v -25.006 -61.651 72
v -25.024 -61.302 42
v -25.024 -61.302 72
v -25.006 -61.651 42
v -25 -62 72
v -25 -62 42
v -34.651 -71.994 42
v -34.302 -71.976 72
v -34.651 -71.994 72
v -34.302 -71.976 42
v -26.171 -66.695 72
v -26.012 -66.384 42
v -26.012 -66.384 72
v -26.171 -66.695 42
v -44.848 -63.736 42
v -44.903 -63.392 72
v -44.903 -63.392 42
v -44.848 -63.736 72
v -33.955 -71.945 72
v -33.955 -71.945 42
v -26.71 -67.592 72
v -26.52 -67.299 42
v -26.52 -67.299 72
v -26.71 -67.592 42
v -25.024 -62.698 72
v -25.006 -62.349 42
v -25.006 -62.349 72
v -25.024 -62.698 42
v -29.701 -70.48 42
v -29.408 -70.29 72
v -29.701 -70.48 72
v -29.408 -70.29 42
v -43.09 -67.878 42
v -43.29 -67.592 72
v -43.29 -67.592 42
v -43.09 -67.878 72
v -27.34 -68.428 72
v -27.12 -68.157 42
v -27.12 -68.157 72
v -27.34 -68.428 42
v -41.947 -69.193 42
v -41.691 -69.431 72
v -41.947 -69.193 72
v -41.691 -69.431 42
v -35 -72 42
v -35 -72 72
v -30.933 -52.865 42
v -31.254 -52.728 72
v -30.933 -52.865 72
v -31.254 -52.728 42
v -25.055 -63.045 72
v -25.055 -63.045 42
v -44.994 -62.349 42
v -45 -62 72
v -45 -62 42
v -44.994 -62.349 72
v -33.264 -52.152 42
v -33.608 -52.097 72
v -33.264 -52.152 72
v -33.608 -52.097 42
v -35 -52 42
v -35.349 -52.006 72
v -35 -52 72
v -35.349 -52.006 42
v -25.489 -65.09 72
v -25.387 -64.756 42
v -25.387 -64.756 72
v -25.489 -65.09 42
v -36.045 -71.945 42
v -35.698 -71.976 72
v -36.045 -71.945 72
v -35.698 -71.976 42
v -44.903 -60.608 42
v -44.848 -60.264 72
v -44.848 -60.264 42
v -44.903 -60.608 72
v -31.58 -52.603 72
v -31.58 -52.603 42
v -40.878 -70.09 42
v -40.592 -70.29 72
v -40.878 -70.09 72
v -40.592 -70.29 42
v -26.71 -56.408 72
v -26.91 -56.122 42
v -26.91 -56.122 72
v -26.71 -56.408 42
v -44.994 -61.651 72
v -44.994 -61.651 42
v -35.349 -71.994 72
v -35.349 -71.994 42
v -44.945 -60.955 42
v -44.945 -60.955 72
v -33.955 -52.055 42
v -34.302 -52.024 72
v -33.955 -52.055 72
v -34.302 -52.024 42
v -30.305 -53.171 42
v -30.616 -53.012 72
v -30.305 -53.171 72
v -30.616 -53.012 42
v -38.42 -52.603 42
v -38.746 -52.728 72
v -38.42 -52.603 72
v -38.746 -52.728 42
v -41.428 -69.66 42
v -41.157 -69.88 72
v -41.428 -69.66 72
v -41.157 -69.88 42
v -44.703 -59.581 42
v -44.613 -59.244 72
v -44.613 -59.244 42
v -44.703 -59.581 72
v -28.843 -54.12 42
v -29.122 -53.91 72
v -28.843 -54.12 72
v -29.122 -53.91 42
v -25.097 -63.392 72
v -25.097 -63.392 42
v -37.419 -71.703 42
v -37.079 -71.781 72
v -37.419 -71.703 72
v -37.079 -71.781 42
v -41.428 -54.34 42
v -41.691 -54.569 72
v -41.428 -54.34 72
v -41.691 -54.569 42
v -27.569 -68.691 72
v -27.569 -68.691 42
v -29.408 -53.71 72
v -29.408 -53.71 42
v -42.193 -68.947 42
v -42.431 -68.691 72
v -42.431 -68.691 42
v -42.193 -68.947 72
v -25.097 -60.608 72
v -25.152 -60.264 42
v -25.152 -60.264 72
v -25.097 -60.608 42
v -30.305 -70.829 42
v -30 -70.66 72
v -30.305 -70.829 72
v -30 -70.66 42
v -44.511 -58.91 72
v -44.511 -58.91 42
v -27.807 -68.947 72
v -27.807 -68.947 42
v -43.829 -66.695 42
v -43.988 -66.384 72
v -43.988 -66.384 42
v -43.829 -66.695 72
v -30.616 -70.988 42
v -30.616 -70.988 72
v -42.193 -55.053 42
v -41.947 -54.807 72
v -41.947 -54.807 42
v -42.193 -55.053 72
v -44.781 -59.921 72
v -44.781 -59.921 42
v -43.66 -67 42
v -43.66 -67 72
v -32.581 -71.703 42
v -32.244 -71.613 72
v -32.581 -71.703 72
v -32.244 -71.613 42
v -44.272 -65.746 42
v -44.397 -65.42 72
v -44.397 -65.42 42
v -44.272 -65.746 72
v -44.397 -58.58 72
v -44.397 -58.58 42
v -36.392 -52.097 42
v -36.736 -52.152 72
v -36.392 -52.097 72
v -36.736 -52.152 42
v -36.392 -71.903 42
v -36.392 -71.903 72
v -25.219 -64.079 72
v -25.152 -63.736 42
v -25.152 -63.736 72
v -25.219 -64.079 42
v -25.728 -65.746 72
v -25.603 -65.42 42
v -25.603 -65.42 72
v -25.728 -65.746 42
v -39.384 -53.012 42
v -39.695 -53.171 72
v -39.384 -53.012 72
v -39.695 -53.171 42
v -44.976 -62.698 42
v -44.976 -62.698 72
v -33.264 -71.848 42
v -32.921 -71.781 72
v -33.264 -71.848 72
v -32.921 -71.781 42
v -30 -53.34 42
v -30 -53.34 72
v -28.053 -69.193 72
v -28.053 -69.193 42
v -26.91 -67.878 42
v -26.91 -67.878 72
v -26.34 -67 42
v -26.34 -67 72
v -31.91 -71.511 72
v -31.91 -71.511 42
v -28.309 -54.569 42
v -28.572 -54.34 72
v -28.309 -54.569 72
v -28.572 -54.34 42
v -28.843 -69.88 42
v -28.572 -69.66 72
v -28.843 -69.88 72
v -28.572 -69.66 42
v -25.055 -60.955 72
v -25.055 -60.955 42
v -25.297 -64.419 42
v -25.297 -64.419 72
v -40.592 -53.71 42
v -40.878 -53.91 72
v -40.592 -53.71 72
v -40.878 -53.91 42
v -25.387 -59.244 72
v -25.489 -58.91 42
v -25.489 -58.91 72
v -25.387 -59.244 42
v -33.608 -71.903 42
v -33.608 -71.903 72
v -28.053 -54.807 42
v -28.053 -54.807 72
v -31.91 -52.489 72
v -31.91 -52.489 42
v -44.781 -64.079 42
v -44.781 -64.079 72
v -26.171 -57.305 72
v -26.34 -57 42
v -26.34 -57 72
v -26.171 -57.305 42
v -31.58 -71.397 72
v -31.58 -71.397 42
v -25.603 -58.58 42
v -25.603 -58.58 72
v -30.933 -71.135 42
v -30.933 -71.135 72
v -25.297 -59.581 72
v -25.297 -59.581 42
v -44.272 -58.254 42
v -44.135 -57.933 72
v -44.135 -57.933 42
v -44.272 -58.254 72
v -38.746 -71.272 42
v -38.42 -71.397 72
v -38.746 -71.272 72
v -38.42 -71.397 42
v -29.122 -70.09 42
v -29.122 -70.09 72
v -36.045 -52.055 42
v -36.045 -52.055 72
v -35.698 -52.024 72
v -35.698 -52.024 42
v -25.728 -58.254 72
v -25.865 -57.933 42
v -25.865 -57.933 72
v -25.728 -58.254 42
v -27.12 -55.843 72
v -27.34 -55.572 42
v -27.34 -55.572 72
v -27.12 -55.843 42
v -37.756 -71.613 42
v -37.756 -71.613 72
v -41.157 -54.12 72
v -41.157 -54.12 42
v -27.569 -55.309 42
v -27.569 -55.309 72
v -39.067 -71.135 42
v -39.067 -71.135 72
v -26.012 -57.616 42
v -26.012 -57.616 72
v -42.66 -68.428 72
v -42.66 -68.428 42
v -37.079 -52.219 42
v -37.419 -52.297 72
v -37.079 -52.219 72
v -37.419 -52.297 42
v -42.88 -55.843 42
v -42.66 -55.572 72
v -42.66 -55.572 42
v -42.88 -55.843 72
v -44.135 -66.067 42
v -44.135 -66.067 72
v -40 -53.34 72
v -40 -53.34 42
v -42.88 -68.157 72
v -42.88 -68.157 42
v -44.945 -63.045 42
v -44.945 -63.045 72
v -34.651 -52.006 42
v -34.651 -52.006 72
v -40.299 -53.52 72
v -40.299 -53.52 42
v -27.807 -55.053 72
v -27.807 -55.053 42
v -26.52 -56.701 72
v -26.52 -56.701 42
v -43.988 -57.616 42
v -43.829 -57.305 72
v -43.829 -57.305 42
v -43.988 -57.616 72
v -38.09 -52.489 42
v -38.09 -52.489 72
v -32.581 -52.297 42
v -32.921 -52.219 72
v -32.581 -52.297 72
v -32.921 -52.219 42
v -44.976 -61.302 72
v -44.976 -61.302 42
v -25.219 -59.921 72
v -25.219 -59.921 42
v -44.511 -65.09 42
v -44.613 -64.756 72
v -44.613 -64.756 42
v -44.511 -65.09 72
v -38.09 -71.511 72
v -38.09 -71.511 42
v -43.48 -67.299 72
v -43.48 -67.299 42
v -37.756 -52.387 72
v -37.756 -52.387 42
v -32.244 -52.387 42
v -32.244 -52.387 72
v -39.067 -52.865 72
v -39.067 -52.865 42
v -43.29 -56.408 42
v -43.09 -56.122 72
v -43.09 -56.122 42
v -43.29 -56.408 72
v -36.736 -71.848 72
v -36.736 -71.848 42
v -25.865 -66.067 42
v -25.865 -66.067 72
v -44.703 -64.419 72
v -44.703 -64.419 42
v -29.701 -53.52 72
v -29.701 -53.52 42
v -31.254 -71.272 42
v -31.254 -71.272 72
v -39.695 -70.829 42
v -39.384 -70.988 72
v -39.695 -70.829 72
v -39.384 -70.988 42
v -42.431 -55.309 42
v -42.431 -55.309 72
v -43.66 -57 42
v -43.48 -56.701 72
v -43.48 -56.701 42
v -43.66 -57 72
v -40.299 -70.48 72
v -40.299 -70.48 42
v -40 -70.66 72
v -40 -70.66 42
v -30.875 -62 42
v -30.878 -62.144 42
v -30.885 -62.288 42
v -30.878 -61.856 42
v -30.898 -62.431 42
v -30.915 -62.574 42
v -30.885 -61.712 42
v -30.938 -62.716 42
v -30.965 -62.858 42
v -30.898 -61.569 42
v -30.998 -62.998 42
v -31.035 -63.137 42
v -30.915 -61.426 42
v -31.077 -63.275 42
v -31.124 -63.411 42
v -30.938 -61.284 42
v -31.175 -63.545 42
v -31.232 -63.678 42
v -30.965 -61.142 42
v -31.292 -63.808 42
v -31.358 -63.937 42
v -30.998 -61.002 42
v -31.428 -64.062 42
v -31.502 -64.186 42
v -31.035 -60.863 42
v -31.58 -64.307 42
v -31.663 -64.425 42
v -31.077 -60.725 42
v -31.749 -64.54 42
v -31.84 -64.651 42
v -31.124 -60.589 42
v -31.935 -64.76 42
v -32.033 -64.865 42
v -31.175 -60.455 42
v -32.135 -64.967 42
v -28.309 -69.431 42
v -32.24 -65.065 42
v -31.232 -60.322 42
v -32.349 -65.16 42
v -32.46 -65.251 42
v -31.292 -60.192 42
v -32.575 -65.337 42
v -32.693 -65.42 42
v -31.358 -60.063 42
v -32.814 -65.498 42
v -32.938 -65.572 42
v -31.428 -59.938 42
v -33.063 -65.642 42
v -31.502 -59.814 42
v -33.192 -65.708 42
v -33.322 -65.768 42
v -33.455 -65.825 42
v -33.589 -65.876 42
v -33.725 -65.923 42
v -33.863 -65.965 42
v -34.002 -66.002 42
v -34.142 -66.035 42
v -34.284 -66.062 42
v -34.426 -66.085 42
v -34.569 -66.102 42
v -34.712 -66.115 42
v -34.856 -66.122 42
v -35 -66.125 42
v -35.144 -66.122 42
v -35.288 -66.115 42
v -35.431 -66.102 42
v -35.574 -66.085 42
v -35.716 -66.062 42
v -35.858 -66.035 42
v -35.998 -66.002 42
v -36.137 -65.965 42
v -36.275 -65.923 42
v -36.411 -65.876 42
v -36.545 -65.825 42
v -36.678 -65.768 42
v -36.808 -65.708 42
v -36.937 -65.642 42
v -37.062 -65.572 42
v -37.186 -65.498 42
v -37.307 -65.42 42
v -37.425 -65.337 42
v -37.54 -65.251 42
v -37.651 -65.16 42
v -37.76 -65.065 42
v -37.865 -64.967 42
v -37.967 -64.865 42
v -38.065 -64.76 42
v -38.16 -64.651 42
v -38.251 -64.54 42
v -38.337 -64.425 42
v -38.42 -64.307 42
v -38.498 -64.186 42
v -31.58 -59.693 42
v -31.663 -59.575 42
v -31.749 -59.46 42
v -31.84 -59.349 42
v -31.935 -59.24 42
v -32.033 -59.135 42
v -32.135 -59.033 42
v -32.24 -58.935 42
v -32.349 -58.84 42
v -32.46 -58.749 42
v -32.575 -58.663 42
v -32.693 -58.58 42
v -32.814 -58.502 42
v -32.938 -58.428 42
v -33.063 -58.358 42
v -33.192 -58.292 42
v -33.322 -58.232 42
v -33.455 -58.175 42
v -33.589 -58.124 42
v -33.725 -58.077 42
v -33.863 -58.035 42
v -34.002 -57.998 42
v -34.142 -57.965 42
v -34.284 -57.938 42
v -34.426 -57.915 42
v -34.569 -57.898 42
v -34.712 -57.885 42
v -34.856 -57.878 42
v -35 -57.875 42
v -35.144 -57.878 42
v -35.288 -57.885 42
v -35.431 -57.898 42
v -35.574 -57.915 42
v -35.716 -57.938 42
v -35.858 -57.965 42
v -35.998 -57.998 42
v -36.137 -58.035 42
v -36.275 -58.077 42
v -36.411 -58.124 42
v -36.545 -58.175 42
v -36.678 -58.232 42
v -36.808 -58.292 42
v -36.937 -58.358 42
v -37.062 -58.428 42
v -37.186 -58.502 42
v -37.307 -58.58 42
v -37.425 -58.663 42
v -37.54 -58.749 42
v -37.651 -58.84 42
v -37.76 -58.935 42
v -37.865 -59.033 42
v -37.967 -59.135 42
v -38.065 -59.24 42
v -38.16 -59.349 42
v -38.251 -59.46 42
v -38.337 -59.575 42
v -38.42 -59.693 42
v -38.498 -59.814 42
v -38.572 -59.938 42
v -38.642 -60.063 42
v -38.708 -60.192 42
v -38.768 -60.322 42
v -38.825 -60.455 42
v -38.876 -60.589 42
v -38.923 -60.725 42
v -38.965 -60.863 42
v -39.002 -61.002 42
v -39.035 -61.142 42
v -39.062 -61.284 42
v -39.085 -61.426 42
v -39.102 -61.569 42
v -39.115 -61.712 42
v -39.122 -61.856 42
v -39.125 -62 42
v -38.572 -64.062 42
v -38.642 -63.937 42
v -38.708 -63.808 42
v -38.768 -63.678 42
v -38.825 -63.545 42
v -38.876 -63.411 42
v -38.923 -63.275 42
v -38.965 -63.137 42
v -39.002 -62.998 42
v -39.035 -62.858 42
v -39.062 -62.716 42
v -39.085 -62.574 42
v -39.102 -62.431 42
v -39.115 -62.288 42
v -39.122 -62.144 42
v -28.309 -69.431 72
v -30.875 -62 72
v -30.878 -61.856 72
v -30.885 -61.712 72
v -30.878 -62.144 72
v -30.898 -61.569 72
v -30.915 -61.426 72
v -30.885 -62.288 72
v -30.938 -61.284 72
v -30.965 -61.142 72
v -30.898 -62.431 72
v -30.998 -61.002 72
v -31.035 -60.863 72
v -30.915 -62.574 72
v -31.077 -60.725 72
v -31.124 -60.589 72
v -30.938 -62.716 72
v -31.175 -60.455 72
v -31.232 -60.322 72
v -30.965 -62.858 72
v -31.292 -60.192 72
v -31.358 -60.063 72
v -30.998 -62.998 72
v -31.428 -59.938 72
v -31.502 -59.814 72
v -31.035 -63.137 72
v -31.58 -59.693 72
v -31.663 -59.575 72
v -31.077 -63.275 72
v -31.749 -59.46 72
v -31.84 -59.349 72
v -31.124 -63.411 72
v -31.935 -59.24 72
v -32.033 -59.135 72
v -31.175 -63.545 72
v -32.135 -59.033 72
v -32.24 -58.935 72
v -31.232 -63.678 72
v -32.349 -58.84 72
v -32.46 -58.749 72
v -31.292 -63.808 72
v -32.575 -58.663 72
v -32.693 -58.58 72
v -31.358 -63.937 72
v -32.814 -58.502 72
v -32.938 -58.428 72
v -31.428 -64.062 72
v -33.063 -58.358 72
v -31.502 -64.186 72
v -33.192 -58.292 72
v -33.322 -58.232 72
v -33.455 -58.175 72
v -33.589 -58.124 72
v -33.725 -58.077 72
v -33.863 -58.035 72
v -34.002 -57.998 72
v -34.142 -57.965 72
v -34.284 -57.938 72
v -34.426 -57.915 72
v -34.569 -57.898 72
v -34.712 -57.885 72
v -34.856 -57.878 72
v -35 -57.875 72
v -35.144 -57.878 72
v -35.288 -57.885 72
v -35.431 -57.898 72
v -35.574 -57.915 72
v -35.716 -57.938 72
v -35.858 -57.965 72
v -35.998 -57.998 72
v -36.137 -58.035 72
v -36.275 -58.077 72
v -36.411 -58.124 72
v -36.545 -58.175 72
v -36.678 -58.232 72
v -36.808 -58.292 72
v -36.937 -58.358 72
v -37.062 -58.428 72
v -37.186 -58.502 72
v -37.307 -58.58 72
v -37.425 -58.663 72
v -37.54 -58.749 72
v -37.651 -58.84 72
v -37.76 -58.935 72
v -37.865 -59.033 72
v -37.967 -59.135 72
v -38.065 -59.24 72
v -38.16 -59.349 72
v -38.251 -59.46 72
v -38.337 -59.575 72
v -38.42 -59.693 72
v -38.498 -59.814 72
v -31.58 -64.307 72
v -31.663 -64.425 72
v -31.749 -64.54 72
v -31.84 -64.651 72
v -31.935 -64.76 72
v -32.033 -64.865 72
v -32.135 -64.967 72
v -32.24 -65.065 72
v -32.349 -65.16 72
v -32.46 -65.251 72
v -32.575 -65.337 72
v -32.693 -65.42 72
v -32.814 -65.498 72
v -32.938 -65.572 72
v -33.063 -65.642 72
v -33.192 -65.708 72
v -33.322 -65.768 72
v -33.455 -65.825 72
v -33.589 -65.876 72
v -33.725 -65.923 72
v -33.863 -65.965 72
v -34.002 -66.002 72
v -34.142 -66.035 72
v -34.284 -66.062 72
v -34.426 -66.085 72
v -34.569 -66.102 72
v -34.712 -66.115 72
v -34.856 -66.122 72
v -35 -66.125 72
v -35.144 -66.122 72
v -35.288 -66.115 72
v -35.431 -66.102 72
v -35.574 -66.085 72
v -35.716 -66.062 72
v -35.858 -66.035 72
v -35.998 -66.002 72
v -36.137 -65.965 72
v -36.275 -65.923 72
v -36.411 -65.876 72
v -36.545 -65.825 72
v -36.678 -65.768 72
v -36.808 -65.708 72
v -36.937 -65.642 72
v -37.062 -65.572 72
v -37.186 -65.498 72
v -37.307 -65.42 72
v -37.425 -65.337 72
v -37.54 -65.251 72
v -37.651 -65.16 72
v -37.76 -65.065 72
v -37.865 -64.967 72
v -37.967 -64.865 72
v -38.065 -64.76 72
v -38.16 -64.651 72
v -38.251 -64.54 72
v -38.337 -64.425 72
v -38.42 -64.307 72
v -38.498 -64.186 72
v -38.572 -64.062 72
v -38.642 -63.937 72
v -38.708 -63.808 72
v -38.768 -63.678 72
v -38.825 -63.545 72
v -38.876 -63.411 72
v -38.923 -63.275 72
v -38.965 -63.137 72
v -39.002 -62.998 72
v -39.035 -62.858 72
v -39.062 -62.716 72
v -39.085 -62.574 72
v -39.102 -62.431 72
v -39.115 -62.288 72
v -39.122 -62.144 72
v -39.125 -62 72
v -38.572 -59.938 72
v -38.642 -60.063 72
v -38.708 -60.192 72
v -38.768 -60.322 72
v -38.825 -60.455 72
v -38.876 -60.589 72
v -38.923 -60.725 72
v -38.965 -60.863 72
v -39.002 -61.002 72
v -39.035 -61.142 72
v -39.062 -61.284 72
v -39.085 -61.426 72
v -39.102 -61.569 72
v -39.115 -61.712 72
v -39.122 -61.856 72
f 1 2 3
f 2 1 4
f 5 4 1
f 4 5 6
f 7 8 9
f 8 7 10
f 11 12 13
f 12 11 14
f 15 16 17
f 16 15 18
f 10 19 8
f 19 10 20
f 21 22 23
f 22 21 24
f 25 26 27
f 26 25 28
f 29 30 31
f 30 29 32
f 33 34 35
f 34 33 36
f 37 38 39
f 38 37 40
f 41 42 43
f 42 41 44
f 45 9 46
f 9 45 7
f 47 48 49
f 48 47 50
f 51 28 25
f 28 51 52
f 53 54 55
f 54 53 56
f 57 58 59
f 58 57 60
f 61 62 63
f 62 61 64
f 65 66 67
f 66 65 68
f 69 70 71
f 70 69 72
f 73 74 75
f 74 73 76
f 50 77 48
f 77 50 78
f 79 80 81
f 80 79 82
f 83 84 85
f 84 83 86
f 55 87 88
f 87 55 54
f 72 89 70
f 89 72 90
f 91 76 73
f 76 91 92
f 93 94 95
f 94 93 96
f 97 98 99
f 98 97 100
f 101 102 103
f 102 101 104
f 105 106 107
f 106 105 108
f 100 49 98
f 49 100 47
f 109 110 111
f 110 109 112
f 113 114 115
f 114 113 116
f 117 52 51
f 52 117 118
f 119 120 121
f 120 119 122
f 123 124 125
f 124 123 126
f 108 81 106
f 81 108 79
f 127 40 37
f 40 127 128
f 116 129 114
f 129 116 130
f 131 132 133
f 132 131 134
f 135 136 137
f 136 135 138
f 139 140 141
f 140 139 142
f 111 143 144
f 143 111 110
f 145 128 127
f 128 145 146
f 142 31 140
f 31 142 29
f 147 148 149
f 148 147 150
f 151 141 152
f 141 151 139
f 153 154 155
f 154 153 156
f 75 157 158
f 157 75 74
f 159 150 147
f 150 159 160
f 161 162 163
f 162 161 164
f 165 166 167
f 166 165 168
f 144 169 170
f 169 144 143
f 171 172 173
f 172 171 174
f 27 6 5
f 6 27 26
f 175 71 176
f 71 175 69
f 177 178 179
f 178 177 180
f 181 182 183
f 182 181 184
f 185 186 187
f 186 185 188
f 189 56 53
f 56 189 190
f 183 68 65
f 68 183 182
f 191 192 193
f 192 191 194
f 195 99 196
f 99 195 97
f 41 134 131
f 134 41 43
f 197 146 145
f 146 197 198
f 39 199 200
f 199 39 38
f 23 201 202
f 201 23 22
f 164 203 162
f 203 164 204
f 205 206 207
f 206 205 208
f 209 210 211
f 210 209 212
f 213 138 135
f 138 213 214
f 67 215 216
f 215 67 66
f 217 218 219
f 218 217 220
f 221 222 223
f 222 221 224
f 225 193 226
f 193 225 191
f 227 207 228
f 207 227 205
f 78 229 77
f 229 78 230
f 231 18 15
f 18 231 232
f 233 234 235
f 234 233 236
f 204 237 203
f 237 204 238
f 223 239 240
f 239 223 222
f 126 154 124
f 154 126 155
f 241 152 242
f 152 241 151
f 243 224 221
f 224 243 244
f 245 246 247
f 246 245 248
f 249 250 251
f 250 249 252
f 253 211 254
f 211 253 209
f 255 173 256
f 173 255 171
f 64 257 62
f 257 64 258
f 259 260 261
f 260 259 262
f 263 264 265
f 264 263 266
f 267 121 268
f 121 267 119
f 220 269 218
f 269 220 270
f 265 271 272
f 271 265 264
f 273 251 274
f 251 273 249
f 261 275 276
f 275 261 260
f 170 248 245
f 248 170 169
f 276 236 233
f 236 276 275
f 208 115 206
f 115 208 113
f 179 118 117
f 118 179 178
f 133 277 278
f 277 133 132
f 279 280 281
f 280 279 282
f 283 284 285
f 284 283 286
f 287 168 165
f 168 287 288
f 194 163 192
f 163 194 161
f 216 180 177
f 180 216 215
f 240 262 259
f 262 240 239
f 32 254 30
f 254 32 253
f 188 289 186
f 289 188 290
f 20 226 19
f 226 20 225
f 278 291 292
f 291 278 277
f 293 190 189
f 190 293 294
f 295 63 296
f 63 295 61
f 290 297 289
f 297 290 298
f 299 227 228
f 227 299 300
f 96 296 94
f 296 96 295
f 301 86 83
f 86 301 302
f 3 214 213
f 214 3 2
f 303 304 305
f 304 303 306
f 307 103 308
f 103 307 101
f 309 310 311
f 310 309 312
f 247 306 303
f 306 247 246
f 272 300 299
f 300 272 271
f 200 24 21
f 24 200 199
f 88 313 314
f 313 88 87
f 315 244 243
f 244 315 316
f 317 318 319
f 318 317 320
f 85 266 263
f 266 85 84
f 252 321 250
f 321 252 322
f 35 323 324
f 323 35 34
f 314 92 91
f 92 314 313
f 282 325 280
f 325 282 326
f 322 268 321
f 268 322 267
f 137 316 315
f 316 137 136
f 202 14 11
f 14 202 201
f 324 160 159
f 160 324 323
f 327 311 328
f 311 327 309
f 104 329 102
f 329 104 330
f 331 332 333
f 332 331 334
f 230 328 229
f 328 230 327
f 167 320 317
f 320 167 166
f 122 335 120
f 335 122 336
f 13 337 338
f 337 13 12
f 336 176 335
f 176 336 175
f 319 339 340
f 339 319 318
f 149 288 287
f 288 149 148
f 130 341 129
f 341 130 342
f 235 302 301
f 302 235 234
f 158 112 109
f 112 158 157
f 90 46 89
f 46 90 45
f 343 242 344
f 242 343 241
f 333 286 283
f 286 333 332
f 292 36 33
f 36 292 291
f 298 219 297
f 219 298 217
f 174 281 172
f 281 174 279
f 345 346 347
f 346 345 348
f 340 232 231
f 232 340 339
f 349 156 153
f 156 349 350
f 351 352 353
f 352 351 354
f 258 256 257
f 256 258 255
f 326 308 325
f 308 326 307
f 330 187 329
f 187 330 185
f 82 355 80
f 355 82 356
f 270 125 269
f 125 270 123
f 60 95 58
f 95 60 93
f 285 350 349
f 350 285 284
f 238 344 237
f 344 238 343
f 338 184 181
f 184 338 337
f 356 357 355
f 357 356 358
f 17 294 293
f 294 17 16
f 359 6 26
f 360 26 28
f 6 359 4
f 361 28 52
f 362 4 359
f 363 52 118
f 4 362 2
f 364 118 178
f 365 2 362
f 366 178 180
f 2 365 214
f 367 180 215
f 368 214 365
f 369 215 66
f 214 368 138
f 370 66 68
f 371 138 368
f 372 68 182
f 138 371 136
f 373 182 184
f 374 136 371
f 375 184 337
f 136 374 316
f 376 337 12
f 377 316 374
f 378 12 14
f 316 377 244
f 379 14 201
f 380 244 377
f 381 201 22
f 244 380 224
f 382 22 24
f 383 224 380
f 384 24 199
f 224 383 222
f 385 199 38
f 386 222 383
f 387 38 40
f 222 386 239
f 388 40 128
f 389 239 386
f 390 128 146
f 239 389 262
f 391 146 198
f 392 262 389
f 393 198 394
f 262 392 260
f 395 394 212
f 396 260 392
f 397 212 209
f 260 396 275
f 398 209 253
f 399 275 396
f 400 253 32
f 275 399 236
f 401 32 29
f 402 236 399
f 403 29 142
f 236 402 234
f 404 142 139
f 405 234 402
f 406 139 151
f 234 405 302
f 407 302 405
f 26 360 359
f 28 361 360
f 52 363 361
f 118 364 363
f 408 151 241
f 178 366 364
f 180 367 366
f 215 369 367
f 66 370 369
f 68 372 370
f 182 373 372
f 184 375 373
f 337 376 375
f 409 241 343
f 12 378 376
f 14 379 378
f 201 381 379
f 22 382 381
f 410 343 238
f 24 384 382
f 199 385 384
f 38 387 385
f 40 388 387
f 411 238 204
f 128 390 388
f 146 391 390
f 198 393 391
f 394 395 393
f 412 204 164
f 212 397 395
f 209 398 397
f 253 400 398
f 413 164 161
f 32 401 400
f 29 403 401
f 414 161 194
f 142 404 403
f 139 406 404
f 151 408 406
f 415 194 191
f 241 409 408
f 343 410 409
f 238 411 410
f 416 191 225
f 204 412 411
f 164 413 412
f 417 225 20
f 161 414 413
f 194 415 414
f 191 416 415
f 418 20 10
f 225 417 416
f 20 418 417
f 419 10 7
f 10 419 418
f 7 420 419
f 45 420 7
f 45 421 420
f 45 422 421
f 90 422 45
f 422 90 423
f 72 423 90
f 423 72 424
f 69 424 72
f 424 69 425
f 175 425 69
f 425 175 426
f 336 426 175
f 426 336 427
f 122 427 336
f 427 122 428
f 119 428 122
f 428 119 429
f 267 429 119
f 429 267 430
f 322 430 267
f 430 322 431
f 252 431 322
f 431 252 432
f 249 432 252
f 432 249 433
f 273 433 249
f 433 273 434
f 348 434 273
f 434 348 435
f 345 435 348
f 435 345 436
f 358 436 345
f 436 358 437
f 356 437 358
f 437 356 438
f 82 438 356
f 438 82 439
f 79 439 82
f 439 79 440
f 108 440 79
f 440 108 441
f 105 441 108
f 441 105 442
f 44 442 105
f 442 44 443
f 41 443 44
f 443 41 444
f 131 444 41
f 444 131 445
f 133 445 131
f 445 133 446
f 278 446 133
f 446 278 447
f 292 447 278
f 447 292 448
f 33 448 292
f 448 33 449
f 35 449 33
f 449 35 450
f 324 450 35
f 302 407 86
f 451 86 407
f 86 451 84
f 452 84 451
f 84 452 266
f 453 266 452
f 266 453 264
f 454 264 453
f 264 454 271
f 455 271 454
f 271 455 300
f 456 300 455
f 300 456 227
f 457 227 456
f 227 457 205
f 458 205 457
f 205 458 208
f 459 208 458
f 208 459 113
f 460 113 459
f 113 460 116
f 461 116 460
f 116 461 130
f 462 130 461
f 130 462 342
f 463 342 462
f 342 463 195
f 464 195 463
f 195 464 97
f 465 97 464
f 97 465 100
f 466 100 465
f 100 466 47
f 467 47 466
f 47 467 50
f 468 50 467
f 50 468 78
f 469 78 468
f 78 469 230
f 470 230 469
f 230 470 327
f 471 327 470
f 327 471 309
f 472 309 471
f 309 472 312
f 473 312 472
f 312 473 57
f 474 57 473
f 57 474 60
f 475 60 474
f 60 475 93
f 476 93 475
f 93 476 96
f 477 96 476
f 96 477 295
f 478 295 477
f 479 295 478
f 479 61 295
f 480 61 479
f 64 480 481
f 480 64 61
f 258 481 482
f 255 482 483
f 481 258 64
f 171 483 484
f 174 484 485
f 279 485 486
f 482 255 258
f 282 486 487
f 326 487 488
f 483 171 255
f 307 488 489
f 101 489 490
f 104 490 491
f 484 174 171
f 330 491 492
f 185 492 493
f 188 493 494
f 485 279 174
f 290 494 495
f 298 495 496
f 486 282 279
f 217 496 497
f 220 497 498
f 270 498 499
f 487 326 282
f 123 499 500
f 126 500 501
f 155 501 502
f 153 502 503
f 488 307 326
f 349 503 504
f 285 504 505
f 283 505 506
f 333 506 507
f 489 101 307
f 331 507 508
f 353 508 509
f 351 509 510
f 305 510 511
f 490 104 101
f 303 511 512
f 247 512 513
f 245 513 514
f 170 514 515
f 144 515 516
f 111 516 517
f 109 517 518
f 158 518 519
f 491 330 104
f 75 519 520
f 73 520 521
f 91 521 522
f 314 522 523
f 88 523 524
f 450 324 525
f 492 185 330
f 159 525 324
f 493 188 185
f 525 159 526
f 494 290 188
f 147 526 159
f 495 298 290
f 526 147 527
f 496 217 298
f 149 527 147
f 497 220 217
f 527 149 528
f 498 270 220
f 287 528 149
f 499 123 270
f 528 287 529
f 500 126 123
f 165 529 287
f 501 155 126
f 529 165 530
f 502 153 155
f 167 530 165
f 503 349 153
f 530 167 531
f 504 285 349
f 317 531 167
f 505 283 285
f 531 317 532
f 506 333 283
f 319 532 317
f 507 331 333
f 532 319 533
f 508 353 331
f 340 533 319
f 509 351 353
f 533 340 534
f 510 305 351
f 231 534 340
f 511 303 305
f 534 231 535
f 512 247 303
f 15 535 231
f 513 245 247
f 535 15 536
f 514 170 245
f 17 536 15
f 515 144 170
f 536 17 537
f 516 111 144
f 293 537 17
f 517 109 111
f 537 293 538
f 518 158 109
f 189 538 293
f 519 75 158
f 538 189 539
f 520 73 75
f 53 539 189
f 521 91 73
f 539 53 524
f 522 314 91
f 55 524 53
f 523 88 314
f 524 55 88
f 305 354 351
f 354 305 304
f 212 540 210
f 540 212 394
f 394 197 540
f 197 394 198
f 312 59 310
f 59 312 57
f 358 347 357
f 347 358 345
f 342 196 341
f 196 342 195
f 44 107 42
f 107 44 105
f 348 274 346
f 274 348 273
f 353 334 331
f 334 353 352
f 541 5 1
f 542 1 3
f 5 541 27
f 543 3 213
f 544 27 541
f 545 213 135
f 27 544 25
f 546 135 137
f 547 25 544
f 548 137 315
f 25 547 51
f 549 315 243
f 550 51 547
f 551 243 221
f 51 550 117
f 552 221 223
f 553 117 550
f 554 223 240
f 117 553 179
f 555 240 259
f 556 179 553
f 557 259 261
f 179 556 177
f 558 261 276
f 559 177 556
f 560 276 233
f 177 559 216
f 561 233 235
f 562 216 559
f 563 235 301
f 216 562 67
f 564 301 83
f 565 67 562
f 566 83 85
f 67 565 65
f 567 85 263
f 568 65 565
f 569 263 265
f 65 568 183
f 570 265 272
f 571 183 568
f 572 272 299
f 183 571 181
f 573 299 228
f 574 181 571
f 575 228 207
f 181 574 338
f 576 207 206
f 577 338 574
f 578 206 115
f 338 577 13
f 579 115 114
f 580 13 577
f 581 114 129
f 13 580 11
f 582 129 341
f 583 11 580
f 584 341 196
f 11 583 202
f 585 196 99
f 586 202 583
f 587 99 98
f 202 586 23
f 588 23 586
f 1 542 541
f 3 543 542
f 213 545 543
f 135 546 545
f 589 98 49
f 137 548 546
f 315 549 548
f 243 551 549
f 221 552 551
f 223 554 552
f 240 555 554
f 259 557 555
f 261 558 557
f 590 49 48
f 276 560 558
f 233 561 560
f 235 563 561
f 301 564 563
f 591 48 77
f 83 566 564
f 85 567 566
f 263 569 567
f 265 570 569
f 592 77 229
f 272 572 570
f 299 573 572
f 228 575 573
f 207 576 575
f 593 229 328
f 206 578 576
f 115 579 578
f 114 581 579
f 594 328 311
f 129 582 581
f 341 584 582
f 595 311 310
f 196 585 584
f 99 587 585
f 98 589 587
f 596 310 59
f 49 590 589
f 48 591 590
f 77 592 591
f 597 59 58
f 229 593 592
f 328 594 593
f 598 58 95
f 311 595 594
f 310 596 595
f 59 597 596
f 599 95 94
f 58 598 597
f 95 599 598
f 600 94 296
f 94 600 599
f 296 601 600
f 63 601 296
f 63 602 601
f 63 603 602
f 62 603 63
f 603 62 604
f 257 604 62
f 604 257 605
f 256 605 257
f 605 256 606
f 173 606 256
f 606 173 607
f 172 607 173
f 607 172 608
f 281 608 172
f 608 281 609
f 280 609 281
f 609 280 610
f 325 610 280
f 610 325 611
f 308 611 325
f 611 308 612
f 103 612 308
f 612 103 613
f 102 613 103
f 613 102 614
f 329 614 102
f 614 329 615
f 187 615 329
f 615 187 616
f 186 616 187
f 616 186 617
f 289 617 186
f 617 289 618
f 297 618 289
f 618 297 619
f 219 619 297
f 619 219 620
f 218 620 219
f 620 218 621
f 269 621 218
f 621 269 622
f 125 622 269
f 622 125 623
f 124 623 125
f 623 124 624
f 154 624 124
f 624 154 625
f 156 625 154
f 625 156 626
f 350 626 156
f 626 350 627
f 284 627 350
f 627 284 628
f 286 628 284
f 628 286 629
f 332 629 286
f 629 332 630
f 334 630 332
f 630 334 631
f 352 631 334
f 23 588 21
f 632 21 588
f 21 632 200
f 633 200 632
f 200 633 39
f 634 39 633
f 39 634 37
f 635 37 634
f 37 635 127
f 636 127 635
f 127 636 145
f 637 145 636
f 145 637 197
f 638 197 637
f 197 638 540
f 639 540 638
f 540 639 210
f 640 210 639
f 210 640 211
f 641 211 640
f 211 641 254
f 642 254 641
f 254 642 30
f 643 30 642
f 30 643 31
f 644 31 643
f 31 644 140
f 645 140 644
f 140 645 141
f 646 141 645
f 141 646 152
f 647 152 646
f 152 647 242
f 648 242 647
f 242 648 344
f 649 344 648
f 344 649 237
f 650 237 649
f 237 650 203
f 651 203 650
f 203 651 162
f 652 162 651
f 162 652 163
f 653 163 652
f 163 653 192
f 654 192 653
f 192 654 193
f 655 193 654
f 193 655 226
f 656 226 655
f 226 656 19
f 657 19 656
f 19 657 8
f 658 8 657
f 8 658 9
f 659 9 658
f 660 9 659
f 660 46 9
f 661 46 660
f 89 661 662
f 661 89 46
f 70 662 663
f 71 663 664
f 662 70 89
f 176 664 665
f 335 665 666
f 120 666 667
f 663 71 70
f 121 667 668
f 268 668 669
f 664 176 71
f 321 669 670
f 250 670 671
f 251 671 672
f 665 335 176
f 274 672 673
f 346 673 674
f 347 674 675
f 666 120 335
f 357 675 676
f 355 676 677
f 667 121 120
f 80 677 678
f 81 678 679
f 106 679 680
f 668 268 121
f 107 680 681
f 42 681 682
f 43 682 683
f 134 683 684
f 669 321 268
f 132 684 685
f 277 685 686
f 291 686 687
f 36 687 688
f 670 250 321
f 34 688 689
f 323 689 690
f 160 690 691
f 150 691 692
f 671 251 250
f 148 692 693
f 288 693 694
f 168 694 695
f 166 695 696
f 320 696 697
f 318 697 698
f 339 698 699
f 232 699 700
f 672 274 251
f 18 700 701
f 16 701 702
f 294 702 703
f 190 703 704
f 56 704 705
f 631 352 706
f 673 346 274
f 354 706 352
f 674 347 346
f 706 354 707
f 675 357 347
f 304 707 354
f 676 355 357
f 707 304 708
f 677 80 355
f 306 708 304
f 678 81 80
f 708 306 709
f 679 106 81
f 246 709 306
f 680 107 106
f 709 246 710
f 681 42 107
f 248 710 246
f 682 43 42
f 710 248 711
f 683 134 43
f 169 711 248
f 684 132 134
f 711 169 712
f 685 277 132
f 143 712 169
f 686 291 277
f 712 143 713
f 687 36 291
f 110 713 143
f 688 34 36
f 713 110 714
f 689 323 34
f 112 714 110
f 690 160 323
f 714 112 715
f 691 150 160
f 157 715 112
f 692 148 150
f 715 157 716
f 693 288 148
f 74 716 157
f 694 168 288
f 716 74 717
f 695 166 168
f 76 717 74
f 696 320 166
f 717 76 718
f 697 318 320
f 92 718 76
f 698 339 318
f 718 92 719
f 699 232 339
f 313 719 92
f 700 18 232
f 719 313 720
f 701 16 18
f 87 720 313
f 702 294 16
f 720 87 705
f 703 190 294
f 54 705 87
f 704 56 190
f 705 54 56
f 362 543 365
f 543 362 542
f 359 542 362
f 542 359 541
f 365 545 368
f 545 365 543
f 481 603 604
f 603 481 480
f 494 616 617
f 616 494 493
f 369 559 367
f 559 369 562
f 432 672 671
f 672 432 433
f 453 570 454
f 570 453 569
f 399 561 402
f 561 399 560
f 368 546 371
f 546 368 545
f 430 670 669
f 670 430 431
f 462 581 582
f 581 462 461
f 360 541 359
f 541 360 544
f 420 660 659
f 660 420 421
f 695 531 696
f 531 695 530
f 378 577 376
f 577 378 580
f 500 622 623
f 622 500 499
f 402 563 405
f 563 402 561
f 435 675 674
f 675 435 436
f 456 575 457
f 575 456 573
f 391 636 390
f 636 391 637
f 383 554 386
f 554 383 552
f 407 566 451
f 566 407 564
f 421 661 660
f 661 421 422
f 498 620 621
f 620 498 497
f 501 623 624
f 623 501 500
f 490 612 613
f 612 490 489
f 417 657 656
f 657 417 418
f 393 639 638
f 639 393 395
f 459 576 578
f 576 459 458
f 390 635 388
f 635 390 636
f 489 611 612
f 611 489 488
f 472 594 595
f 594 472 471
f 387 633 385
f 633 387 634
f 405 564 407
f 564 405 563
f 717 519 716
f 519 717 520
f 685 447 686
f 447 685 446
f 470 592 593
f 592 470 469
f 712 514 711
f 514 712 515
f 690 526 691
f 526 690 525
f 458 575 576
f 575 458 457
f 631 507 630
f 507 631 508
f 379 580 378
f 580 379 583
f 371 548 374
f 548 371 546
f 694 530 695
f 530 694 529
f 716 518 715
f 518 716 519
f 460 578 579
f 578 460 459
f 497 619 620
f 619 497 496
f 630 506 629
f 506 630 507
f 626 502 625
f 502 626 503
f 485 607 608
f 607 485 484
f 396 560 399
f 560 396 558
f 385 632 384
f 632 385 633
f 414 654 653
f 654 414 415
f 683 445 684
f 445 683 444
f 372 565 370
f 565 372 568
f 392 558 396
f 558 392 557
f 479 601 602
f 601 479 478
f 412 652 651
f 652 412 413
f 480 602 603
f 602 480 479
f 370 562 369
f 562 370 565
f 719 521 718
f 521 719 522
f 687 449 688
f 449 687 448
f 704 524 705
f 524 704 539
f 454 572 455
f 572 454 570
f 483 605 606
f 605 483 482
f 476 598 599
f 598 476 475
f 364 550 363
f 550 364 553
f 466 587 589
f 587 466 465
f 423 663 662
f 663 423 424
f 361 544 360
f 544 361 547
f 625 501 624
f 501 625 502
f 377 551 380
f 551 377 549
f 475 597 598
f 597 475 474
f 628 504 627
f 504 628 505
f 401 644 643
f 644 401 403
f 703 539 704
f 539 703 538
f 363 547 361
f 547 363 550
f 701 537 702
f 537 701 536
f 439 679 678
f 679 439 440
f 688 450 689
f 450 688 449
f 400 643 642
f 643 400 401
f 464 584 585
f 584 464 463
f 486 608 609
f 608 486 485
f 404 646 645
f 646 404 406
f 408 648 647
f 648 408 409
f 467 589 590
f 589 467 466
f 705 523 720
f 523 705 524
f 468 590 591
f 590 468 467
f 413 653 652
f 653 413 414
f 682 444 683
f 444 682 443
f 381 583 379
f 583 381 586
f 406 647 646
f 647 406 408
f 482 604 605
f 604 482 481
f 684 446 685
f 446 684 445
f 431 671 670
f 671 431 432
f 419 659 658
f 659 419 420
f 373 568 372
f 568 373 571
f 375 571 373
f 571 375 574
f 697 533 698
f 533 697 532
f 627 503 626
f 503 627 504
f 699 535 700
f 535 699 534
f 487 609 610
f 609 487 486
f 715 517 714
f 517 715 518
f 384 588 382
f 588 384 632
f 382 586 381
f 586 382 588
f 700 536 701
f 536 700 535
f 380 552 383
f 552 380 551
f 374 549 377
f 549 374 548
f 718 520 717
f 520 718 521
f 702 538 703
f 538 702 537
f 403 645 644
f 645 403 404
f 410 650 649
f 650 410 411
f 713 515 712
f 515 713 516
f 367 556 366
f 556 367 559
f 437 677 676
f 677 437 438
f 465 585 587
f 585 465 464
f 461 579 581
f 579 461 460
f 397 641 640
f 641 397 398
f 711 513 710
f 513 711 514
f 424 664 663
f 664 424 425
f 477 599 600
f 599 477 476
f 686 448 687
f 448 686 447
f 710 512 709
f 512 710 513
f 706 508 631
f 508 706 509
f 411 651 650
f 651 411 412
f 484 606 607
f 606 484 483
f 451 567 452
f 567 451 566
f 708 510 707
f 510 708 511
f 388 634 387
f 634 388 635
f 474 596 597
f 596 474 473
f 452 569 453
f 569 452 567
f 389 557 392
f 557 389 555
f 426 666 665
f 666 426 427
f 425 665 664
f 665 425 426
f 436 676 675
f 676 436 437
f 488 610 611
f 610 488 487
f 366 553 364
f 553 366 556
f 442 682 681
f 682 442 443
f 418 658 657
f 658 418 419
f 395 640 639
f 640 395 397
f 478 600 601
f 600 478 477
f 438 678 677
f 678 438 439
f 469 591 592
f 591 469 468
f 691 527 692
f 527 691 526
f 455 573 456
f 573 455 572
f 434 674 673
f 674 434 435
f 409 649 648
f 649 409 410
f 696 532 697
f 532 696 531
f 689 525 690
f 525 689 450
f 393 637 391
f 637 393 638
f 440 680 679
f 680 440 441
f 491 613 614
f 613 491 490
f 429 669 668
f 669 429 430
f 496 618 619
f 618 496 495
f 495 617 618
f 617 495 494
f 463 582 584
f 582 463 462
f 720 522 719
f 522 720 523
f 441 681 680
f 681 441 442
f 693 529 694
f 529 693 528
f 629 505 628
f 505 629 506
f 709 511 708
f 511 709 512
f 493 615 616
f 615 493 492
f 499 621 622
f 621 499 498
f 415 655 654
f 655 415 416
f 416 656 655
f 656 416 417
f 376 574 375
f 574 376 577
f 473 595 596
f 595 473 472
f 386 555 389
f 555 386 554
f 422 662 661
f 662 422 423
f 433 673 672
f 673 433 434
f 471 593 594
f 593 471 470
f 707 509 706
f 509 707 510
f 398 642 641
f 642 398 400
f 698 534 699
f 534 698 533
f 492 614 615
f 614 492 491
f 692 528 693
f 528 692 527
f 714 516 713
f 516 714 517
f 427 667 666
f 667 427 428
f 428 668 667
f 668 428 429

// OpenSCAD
//cube([120,120,3], center = true);
//translate([-45,-45,0])cylinder(h = 3, r=15, $fn = 180, center = true);
//rotate_extrude(convexity = 10, $fn = A) translate([20+1.5, 0, 0])circle(d = 3, $fn = B);


//translate([63.25,0,142.5])rotate([0,-90,45])import("spool_mount.stl");


//BearingBlock();
//gearboxBottom();
//gearboxTop();
//spacer();



//translate([63.25,0,2.5])smallGear();
//translate([0,0,0]) largeGear();


//translate([63.25,0,60+35]) largeGear();
//translate([0,0,62.5+35])smallGear();


//translate([0,0,-10]) gearboxBottom();

//translate([0,0,10]) gearboxTop();


//translate([0,0,45])gearboxTop2();

//translate([0,0,105])gearboxTop3();

//translate([63.25,0,47+10])BearingBlock();

//translate([0,0,142+10])BearingBlock();
    

//for(i=[-1,1])translate([-60,i*40,45])extentionblock();

//for(i=[-1])for(j=[0])translate([-35,i*(40+22),10+j*95])spacer();
    
//for(i=[-1,1])for(j=[0,1])translate([63.25+35,i*(40+22),10+j*95])spacer();


for(i=[-1])for(j=[1])translate([-35,i*(40+22),10+j*47])spacer_small();
    
//for(i=[-1,1])for(j=[1])translate([63.25+35,i*(40+22),10+j*47])spacer_small();

//translate([0,0,15]) gearboxExtention();







module BearingBlock(){
    
difference(){       
cube([30,80,10], center = true);   
  

for(i=[-1,1])translate([0,i*30,0])cylinder(h = 11, d=6.25, $fn = 180, center = true);
    
for(i=[-1,1])translate([0,i*30,2.5])cylinder(h = 5, d=11.5, $fn = 6, center = true);


translate([0,0,0])cylinder(h = 11, d=14, $fn = 180, center = true);

}

}










module gearboxExtention(){

difference(){
union(){
 
translate([15,0,30])cube([110,100,8], center = true);   
   
   
}

cylinder(h = 80, d=11, $fn = 180, center = true);

for(i=[0,1])mirror([0,i,0])translate([60,40,0]) cylinder(h = 100, d=11, $fn = 180, center = true);
    
for(i=[0,1])mirror([0,i,0])translate([-30,40,0]) cylinder(h = 100, d=11, $fn = 180, center = true);


translate([35,0,0])cylinder(h = 80, d=11, $fn = 180, center = true);


translate([0,0,0]) for(i=[0:2])rotate([0,0,90+i*90])translate([31,0,0]) cylinder(h = 80, d=6.25, $fn = 180, center = true);
    

for(i=[0:1])mirror([0,i,0])translate([15,52,30])cube([60,20,9], center = true);   
    
for(i=[0:1])mirror([0,i,0])translate([-30,35,30])cube([30,40,9], center = true); 

translate([50,0,30])cube([70,110,9], center = true); 



}

}













module extentionblock(){
 
difference(){    
//cube([20,20,8], center = true); 
    
cylinder(h = 8, d=20, $fn = 180, center = true);      
  
cylinder(h = 10, d=5.2, $fn = 180, center = true);    
}    
}    

















module spacer(){
    
    
difference(){    
cylinder(h = /*45*/ 55, d=20, $fn = 180, center = true); 
   
//cube([20,20,45], center = true);    


cylinder(h = 56, d=8.25, $fn = 180, center = true);  
    
translate([-5,4.7,27])linear_extrude(height = 1)text("PLA",4);    
}

}






module spacer_small(){
    
difference(){    
cylinder(h = /*45*/ 30, d=20, $fn = 180, center = true); 
   
//cube([20,20,45], center = true);    


cylinder(h = 56, d=8.25, $fn = 180, center = true);  
    
translate([-5,4,27])linear_extrude(height = 1)text("PLA",4);    
}
    
    
}


















module gearboxBottom(){

difference(){
union(){
    
 
    
//Plate 
translate([15-5+21.5,0,-10+0.5])cube([110+45,100+45,5], center = true);   
}

for(i=[0:1])mirror([0,i,0])translate([32,60+10,-10])cube([110,30,7], center = true);  


//extra eliminations/////   
//translate([-30-30,0,-10])cube([28,50,5], center = true); 

//translate([70.5,0,-10])cube([25,15,5], center = true); 
/////////////////////////


//connector holes/////
for(i=[-1,1])translate([63.25+35,i*(40+22),0]) cylinder(h = 100, d=8.25, $fn = 180, center = true);
    
for(i=[-1,1])translate([-35,i*(40+22),0]) cylinder(h = 100, d=8.25, $fn = 180, center = true);
/////////////////////

//mid hole large hear
cylinder(h = 50, d=11, $fn = 180, center = true);

//small gear hole
translate([35-35+63.25,0,0])cylinder(h = 50, d=11, $fn = 180, center = true);





//translate([35,0,0]) for(i=[0:3])rotate([0,0,45+i*90])translate([31,0,0]) cylinder(h = 50, d=5.25, $fn = 180, center = true);


//Flange bearing holes
for(i=[0:1])mirror([0,i,0])translate([0,36.5/2,0])cylinder(h = 80, d=5.25, $fn = 180, center = true);



translate([35-35+63.25,0,0])for(i=[0:3])rotate([0,0,i*90])translate([15.5,15.5,0])cylinder(h = 80, d=7, $fn = 180, center = true);


//holes for stepper motor screws
translate([15.5,0,15.5]) rotate([90,0,0]) cylinder(h = 80, d=3, $fn = 180, center = true);

translate([-15.5,0,15.5]) rotate([90,0,0]) cylinder(h = 20, d=3, $fn = 180, center = true);

translate([-15.5,0,-15.5]) rotate([90,0,0]) cylinder(h = 20, d=3, $fn = 180, center = true);

translate([15.5,0,-15.5]) rotate([90,0,0]) cylinder(h = 20, d=3, $fn = 180, center = true);



}



translate([35-35+63.25,0,-2]) rotate([90,0,0]){

////////////////////////////////////////////////////////
//Stepper motor mount
////////////////////////////////////////////////////////

difference(){
    
union(){    
for(i=[0:1]) rotate([0,0,0]) translate([0,-50+5+3,0]) rotate([90,i*90,0]) cube([50-8,23,10], center = true);  

rotate([0,0,0]) translate([0,-50+5+3,0]) rotate([90,0,0]) cylinder(h = 10, d=35, $fn = 180, center = true); 


translate([0,-40,0]) cube([42,6,42], center = true);


}
   
//translate([0,-50+5,0]) rotate([90,0,0]) cube([5,25,20], center = true);


//middle hole    
translate([0,-50+5,0]) rotate([90,0,0]) cylinder(h = 30, d=23, $fn = 180, center = true); 





//holes for stepper motor screws
translate([15.5,-50+5,15.5]) rotate([90,0,0]) cylinder(h = 20, d=3, $fn = 180, center = true);

translate([-15.5,-50+5,15.5]) rotate([90,0,0]) cylinder(h = 20, d=3, $fn = 180, center = true);

translate([-15.5,-50+5,-15.5]) rotate([90,0,0]) cylinder(h = 20, d=3, $fn = 180, center = true);

translate([15.5,-50+5,-15.5]) rotate([90,0,0]) cylinder(h = 20, d=3, $fn = 180, center = true);





}


translate([0,-50+5,0]) rotate([0,0,0]){
difference(){
    
    
union(){    
//stepper motor plate
translate([0,0,0]) cube([42,5,42], center = true);


      
rotate([0,0,0]) translate([0,30-5-2-2,0]) cube([42+10,55-10-15,5+2], center = true);
  
rotate([0,90,0]) translate([0,30-5-2-2,0]) cube([42+10,55-10-15,5+2], center = true); 
    
    
//baseplate
//rotate([0,0,0]) translate([0,0,0]) rotate([90,0,0]) cube([50,23,5], center = true);    

}    
  


//middle hole in frame
translate([0,22.5,0]) rotate([90,0,0]) cylinder(h = 60, d1=23, d2=23, $fn = 180, center = true); 



//hole in bearing hole
//translate([0,50,0]) rotate([90,0,0]) cylinder(h = 15, d=25, $fn = 180, center = true); 



//holes for stepper motor screws
translate([15.5,0,15.5]) rotate([90,0,0]) cylinder(h = 20, d=3, $fn = 180, center = true);

translate([-15.5,0,15.5]) rotate([90,0,0]) cylinder(h = 20, d=3, $fn = 180, center = true);

translate([-15.5,0,-15.5]) rotate([90,0,0]) cylinder(h = 20, d=3, $fn = 180, center = true);

translate([15.5,0,-15.5]) rotate([90,0,0]) cylinder(h = 20, d=3, $fn = 180, center = true);
 





//smoothing off 4 side walls
translate([0,30-5,0]){
difference(){
rotate([90,0,0]) translate([0,0,0]) cylinder(h = 55-10, d=50+10, $fn = 180, center = true);

rotate([90,0,0]) translate([0,0,0]) cylinder(h = 55-10, d2=26+16, d1=26+16-2, $fn = 180, center = true); 

}} 
 
  
//back right cylinder empty
//translate([-30,3,0]) rotate([0,0,0]) translate([0,0,0]) cylinder(h = 50, d=9, $fn = 180, center = true); 

//back left cylinder empty
//translate([30,3,0]) rotate([0,0,0]) translate([0,0,0]) cylinder(h = 50, d=9, $fn = 180, center = true); 

 


 //bearing size extended
//translate([0,50-10,0]) rotate([90,0,0]) cylinder(h = 5+20, d=16+0.25, $fn = 180, center = true); 


}





}    


/////////////////////////////////////////////////////////
 

}




























}


  





module gearboxTop(){

difference(){
union(){
 
//Plate 
translate([15-5+21.5,0,30])cube([110+45,100+45,5], center = true);     
   
difference(){   
translate([35-35+63.25,0,24])cylinder(h = 7, d=22.25+8, $fn = 180, center = true);   

//translate([35-35+63.25,0,24.5])cylinder(h = 7, d=22.25, $fn = 180, center = true);   

}




  
}
cylinder(h = 80, d=11, $fn = 180, center = true);

//connector holes/////
for(i=[-1,1])translate([63.25+35,i*(40+22),0]) cylinder(h = 100, d=8.25, $fn = 180, center = true);
 

for(i=[-1,1])translate([-35,i*(40+22),0]) cylinder(h = 100, d=8.25, $fn = 180, center = true);
/////////////////////



//m6 
for(i=[-1,1])translate([63.25,i*30,30])cylinder(h = 20, d=6.25, $fn = 180, center = true);



translate([35-35+63.25,0,0])cylinder(h = 80, d=11, $fn = 180, center = true);


//for(i=[0:3])rotate([0,0,90+i*90])translate([31,0,0]) cylinder(h = 80, d=6.25, $fn = 180, center = true);
    



for(i=[0:1])mirror([0,i,0])translate([32,60+10,30])cube([110,30,5], center = true);   
    
//translate([-30,0,30])cube([28,15,5], center = true); 

//translate([80,0,30])cube([25,40,5], center = true); 

//translate([-60,0,30])cube([30,50,5], center = true); 



translate([35-35+63.25,0,24.5+4+0.5])cylinder(h = 7, d=22.25, $fn = 180, center = true);

}

}









module gearboxTop2(){
    

difference(){
union(){
 
//Plate 
translate([15-5+21.5,0,30])cube([110+45,100+45,5], center = true);     
   

  
}
cylinder(h = 80, d=11, $fn = 180, center = true);

//connector holes/////
for(i=[-1,1])translate([63.25+35,i*(40+22),0]) cylinder(h = 100, d=8.25, $fn = 180, center = true);
 

for(i=[-1,1])translate([-35,i*(40+22),0]) cylinder(h = 100, d=8.25, $fn = 180, center = true);
/////////////////////




    



for(i=[0:1])mirror([0,i,0])translate([32,60+10,30])cube([110,30,5], center = true);   
    
//translate([-30,0,30])cube([28,15,5], center = true); 

//translate([80,0,30])cube([25,40,5], center = true); 

//translate([-60,0,30])cube([30,50,5], center = true); 



//////////Flange bearing//////////////

//mid hole large hear
translate([35-35+63.25,0,24.5+4])cylinder(h = 50, d=11, $fn = 180, center = true);

//Flange bearing holes
for(i=[0:1])mirror([0,i,0])translate([35-35+63.25,36.5/2,24.5+4])cylinder(h = 80, d=5.25, $fn = 180, center = true);

//////////////////////////////////////

}
    
    
    
    
    
    
}


















module gearboxTop3(){

difference(){
union(){
 
//Plate 
translate([15-5+21.5,0,30])cube([110+45,100+45,5], center = true);     
   
difference(){   
translate([0,0,24])cylinder(h = 7, d=22.25+8, $fn = 180, center = true);   

//translate([35-35+63.25,0,24.5])cylinder(h = 7, d=22.25, $fn = 180, center = true);   

}




  
}
cylinder(h = 80, d=11, $fn = 180, center = true);

//connector holes/////
for(i=[-1,1])translate([63.25+35,i*(40+22),0]) cylinder(h = 100, d=8.25, $fn = 180, center = true);
 

for(i=[-1,1])translate([-35,i*(40+22),0]) cylinder(h = 100, d=8.25, $fn = 180, center = true);
/////////////////////



//m6 
for(i=[-1,1])translate([0,i*30,30])cylinder(h = 20, d=6.25, $fn = 180, center = true);



translate([35-35+63.25,0,0])cylinder(h = 80, d=11, $fn = 180, center = true);


for(i=[0:3])translate([63.25,0,0])rotate([0,0,45+90+i*90])translate([31,0,0]) cylinder(h = 80, d=6.25, $fn = 180, center = true);
    



for(i=[0:1])mirror([0,i,0])translate([32,60+10,30])cube([110,30,5], center = true);   
    
//translate([-30,0,30])cube([28,15,5], center = true); 

//translate([80,0,30])cube([25,40,5], center = true); 

//translate([-60,0,30])cube([30,50,5], center = true); 



translate([0,0,24.5+4+0.5])cylinder(h = 7, d=22.25, $fn = 180, center = true);

}
   
    
}





















module smallGear(){

A=60;
B=120;


difference(){
union(){
    
translate([0,0,15])cylinder(h = 15, d=8.25+6, $fn = B, center = true);      
    
for(i=[0:10])rotate([0,0,i*360/11]) translate([7.02,0,-2.5])cylinder(h = 20, d=2, $fn = A, center = true);

translate([0,0,-2.5])cylinder(h = 20, d=7.02*2, $fn = A, center = true);
}

for(i=[0:10])rotate([0,0,360/11/2+i*360/11]) translate([7.02,0,-2.5])cylinder(h = 20, d=2.02, $fn = A, center = true);
    
translate([0,0,17.5])cylinder(h = 20+40, d=8.25, $fn = A, center = true);  


//m3 holes
translate([0,0,11])rotate([90,0,0]) cylinder(h = 15, d=3.2, $fn = B, center = true);  

translate([0,0,18])rotate([0,90,0]) cylinder(h = 15, d=3.2, $fn = B, center = true);  
}
}
























module largeGear(){

A=60;
B=120;




difference(){
union(){
    
translate([0,0,17.5])cylinder(h = 15, d=8.25+6+10, $fn = B, center = true);    
    
    
for(i=[0:175/2])rotate([0,0,i*360/11/4/2]) translate([28*2,0,0])cylinder(h = 20, d=2, $fn = A, center = true);

cylinder(h = 20, d=28*2*2, $fn = B, center = true);


for(j=[0:1])rotate([0,0,j*90]){
difference(){
translate([0,0,17.5])cylinder(h = 15, d1=45+60, d2=14.5+10, $fn = B, center = true);    

rotate([0,0,45]) for(i=[0:1]) mirror([0,i,0])translate([0,21.5+10,17.5]) cube([70+50,40+10,40], center = true);

cylinder(h = 21+40, d=8.25, $fn = A, center = true);

}}


}

for(i=[0:175/2])rotate([0,0,i*360/11/4/2+(360/11/4/2/2)]) translate([28*2,0,0])cylinder(h = 21, d=2.01, $fn = A, center = true);
    
//m3 holes
translate([0,0,11+2.5])rotate([90,0,0]) cylinder(h = 15+10, d=3.2, $fn = B, center = true);  

translate([0,0,18+2.5])rotate([0,90,0]) cylinder(h = 15+10, d=3.2, $fn = B, center = true);  

cylinder(h = 21+40, d=8.25, $fn = A, center = true);


//plate holes
for(i=[0:3])rotate([0,0,i*90])translate([34,0,0]) resize([25,42,40]) cylinder(h = 21+40, d=30, $fn = A, center = true);


}

}
 
